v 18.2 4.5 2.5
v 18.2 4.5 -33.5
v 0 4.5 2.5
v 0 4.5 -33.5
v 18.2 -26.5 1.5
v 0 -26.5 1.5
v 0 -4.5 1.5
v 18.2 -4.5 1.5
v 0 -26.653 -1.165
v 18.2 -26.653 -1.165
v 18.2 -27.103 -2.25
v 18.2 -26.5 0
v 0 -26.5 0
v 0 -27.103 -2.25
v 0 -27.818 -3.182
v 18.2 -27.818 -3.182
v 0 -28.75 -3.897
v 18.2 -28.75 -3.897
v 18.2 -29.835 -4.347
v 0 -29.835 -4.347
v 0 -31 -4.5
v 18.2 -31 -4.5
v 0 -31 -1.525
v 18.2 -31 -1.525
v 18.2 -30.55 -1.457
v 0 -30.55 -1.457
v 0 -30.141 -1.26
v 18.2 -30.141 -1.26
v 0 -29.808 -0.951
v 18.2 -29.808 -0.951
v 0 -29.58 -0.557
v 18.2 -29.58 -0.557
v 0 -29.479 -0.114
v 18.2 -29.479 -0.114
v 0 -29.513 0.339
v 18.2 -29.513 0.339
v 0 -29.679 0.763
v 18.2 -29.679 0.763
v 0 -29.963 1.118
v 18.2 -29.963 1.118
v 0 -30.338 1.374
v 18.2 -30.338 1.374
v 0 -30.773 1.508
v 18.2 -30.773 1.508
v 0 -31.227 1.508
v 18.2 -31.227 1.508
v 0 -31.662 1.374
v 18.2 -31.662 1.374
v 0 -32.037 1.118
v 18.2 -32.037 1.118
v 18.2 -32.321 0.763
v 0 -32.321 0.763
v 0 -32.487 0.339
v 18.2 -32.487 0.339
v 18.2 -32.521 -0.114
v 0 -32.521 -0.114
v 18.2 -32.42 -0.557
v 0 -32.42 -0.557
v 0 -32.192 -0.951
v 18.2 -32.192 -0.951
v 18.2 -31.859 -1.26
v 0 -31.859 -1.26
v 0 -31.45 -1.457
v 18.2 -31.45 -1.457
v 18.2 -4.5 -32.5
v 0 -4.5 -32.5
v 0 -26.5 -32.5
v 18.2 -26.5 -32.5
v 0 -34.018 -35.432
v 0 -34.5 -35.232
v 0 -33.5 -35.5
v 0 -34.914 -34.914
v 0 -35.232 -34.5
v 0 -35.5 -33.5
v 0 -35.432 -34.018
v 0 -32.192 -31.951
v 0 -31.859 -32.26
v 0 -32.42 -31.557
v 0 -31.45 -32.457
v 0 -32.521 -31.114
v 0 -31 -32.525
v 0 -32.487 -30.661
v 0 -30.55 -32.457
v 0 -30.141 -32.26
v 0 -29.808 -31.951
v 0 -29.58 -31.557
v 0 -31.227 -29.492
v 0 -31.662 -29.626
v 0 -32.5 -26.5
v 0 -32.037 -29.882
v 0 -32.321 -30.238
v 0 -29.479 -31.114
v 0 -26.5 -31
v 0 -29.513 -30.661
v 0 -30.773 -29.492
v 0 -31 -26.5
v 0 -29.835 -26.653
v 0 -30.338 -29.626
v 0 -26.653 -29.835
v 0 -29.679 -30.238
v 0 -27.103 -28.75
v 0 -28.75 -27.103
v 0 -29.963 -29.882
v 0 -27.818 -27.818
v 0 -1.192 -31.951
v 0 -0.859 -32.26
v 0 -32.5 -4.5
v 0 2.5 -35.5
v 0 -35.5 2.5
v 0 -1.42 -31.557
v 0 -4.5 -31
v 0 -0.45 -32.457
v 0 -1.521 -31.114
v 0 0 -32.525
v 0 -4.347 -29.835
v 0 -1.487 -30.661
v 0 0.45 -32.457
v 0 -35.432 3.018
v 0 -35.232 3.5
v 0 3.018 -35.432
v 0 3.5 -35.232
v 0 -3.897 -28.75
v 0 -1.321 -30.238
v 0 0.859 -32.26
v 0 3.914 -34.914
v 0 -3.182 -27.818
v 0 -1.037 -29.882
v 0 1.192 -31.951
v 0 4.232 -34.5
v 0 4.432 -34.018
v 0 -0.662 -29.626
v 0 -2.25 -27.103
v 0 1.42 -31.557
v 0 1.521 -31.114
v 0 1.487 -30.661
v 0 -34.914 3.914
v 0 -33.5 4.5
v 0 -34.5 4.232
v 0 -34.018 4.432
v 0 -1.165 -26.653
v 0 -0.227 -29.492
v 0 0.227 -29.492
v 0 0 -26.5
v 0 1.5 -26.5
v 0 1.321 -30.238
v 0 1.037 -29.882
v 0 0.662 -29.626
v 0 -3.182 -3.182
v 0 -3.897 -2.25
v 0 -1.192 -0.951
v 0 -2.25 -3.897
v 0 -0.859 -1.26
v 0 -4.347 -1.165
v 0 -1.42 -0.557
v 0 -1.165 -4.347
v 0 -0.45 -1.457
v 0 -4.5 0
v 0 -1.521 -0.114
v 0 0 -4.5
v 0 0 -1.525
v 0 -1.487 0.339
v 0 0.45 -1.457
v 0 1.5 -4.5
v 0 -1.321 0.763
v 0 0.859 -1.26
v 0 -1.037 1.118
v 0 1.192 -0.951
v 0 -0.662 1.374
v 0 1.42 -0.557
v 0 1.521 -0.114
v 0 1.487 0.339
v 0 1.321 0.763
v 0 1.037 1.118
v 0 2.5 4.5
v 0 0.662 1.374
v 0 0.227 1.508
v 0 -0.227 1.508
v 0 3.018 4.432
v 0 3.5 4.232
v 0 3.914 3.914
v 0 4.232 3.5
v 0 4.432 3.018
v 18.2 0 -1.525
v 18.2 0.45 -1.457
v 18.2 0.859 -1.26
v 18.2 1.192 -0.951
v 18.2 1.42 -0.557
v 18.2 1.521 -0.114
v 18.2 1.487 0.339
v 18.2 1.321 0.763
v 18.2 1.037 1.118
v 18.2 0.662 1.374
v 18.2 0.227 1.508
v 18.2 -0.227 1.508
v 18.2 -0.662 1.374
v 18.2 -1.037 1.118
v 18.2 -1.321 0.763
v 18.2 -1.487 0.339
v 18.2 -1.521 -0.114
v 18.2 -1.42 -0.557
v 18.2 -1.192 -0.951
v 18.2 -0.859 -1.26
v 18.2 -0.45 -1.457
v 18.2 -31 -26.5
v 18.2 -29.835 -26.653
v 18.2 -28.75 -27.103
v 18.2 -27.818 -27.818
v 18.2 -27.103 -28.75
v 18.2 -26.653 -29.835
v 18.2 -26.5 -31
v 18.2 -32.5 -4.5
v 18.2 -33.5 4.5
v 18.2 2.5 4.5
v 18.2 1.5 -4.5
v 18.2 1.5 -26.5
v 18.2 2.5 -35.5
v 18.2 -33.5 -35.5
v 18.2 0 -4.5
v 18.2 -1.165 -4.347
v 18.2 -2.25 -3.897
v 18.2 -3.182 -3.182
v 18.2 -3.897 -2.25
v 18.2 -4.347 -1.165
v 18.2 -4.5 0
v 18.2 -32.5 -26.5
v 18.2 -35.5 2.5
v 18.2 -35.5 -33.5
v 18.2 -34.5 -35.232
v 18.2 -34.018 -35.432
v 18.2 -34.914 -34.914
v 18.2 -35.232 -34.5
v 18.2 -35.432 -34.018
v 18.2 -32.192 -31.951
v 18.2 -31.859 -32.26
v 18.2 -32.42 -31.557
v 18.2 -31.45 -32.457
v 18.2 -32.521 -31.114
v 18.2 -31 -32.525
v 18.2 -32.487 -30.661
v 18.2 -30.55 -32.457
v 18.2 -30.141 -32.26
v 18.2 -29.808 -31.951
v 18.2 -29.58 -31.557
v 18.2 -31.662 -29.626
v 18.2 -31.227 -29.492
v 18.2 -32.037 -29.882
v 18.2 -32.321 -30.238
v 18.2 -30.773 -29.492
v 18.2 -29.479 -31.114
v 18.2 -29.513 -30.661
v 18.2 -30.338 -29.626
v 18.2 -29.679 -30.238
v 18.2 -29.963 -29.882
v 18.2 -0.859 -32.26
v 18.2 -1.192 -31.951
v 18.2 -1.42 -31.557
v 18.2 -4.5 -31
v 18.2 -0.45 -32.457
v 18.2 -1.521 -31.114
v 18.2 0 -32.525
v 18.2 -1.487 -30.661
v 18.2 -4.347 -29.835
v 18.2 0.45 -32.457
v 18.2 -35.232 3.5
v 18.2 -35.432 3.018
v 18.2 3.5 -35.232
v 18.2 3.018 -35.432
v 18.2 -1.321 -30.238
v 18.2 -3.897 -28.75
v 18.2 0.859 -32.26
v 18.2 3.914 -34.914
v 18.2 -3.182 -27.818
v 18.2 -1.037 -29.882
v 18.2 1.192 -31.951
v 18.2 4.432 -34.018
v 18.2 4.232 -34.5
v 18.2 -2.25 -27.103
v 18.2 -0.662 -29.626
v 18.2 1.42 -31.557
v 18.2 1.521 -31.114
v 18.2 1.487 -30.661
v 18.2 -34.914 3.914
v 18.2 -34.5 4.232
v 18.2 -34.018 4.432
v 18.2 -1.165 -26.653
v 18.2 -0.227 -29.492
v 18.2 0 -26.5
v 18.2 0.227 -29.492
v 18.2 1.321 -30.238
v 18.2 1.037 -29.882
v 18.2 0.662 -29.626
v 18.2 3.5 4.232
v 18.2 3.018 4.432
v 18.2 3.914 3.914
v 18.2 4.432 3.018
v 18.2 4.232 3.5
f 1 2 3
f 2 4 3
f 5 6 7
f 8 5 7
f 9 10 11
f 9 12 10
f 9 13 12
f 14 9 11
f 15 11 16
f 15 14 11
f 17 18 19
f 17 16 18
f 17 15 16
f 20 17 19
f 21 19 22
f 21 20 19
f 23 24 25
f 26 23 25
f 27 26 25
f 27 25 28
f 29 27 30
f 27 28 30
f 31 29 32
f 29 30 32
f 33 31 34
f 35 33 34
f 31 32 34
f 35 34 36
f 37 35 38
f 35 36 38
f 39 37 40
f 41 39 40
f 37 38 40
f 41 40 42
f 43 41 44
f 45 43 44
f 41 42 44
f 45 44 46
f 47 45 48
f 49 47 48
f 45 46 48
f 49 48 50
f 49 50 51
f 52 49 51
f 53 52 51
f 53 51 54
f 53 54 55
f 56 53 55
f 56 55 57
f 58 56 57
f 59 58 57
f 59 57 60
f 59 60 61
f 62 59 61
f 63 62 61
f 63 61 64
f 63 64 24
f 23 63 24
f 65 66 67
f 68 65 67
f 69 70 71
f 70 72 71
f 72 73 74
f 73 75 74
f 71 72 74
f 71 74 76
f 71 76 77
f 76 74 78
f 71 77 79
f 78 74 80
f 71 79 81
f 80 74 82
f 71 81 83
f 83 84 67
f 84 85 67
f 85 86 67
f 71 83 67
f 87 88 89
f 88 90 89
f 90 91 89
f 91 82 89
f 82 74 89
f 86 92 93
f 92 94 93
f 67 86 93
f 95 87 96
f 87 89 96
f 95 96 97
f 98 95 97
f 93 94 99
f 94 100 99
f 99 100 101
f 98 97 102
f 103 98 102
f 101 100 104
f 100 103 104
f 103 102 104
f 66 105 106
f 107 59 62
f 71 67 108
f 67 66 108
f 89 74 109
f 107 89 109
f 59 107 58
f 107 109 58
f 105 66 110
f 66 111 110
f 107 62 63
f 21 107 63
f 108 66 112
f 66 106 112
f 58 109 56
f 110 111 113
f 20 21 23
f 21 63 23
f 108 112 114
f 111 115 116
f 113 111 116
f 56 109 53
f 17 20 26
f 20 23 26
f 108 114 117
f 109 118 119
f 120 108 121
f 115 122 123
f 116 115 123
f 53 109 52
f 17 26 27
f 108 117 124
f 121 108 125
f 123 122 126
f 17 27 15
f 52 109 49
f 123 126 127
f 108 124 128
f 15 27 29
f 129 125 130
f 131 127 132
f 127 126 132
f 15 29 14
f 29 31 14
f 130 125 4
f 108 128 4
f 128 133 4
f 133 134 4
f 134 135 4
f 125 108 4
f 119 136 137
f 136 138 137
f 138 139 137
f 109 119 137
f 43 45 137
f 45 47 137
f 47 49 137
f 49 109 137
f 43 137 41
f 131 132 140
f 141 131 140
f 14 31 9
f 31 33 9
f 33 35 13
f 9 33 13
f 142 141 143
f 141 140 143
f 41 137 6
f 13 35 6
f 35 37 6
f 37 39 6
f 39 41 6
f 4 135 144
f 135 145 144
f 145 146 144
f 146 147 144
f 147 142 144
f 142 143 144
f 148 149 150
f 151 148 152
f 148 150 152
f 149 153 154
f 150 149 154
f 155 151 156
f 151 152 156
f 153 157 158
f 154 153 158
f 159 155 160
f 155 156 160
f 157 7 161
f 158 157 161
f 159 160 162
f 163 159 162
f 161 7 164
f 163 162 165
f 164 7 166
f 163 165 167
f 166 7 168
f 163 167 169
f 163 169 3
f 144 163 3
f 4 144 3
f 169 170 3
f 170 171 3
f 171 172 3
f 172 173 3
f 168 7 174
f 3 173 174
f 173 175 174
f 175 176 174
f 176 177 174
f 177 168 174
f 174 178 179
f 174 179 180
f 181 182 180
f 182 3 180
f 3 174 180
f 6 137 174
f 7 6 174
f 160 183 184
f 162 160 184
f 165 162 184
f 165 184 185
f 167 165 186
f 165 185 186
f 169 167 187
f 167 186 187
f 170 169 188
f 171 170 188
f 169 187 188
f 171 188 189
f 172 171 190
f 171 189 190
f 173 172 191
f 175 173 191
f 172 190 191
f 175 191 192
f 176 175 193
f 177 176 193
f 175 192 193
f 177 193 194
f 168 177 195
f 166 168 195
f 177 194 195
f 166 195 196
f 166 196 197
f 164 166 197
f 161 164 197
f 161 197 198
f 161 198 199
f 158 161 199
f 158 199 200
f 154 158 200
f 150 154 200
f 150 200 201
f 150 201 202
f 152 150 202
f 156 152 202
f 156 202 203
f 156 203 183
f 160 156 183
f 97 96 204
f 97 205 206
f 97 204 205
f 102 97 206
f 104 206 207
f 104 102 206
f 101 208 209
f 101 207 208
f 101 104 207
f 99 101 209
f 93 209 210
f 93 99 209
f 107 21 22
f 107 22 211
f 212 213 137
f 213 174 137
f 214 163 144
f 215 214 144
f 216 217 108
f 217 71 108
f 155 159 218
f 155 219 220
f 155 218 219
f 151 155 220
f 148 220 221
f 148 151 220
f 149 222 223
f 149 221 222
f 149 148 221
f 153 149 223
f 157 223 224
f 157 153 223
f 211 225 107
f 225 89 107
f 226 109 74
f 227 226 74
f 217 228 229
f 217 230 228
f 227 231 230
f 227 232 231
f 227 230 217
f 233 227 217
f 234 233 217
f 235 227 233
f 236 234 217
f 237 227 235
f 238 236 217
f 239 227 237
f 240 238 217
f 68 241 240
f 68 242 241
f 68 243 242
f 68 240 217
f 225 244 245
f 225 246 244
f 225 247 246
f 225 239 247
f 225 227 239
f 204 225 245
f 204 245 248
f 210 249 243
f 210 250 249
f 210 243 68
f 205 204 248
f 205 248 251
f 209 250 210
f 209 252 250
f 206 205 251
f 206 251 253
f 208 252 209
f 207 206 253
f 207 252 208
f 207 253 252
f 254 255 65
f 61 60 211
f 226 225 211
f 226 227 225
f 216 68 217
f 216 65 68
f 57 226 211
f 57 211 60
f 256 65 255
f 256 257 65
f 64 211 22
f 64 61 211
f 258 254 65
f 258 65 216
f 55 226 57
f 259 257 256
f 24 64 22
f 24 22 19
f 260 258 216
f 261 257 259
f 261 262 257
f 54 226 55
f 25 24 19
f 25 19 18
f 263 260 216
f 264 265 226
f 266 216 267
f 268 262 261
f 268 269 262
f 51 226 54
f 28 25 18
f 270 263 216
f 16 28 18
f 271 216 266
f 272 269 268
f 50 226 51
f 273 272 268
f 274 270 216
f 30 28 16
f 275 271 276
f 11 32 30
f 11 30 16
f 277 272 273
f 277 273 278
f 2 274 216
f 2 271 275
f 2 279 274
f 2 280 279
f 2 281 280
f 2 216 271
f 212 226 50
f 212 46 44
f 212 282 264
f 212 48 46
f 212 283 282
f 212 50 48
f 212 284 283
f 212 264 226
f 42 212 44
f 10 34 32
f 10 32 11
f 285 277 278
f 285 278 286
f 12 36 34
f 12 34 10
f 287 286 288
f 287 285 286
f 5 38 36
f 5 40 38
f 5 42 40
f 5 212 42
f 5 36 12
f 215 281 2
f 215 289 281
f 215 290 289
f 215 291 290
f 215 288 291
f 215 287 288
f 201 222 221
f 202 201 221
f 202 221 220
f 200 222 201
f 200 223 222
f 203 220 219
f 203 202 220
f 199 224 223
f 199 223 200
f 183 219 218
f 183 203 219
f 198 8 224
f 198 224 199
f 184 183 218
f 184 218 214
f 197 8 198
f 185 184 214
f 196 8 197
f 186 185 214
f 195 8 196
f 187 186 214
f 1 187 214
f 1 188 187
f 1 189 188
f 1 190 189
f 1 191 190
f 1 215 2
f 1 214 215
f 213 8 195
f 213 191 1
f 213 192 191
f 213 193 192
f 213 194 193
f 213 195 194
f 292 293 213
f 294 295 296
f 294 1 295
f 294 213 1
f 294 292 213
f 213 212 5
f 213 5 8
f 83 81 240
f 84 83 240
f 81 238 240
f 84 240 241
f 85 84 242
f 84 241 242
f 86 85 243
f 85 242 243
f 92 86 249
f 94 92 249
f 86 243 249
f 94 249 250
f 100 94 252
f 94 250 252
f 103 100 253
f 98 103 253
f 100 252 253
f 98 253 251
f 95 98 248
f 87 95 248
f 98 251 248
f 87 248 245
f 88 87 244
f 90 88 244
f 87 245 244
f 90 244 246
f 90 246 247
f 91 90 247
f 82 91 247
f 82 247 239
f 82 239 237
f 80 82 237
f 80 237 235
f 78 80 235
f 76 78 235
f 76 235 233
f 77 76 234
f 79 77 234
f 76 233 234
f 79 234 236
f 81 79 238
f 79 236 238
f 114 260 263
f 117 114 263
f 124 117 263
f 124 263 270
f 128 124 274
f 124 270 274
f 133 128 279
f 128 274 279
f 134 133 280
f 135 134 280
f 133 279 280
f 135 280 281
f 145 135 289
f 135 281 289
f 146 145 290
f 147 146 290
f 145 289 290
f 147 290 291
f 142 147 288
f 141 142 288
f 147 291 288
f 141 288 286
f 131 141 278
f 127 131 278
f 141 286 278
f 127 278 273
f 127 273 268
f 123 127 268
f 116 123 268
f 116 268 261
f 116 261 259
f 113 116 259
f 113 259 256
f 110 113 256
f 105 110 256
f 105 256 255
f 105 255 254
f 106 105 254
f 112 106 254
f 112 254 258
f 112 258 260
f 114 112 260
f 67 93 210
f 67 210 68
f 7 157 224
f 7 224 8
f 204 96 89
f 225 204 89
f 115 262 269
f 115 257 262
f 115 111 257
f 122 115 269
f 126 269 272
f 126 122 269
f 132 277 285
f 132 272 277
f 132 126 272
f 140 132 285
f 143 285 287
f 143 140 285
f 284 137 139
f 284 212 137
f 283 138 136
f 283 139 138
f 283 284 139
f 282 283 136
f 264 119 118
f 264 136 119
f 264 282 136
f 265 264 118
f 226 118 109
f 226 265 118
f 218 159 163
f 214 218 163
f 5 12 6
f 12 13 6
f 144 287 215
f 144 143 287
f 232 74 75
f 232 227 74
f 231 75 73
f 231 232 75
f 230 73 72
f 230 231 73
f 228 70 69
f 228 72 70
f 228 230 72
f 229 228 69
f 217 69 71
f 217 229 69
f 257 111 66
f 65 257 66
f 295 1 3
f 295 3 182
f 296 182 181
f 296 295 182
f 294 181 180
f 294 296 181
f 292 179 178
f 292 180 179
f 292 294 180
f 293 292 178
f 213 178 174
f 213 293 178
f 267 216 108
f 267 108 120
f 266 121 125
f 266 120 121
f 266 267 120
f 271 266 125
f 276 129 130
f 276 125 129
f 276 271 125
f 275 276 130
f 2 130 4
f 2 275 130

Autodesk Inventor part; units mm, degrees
ref_plane "YZ Plane" through (0, 0, 0) normal (1, 0, 0) x (0, 1, 0)
ref_plane "XZ Plane" through (0, 0, 0) normal (0, 1, 0) x (-1, 0, 0)
ref_plane "XY Plane" through (0, 0, 0) normal (0, 0, 1) x (1, 0, 0)
sketch "Sketch1" plane through (0, 0, 0) normal (1, 0, 0) x (0, 1, 0)
  circle A0 centre (0, 0) radius 1.45
  circle A1 centre (0, -31) radius 1.45
  circle A2 centre (-31, -31) radius 1.45
  circle A3 centre (-31, 0) radius 1.45
  line L0 (0, 4.5) -> (-31, 4.5)
  line L1 (-31, 4.5) -> (-35.5, 4.5)
  line L2 (-35.5, 4.5) -> (-35.5, -35.5)
  line L3 (-35.5, -35.5) -> (4.5, -35.5)
  line L4 (4.5, -35.5) -> (4.5, 4.5)
  line L5 (4.5, 4.5) -> (0, 4.5)
  arc A4 (-4.5, 0) -> (0, -4.5) centre (0, 0) ccw
  arc A5 (-26.5, -31) -> (-31, -26.5) centre (-31, -31) ccw
  line L6 (-26.5, 0) -> (-26.5, 1.5)
  line L7 (-31, -4.5) -> (-32.5, -4.5)
  line L8 (-31, -26.5) -> (-32.5, -26.5)
  line L9 (-26.5, -31) -> (-26.5, -32.5)
  line L10 (-4.5, -31) -> (-4.5, -32.5)
  line L11 (0, -26.5) -> (1.5, -26.5)
  line L12 (0, -4.5) -> (1.5, -4.5)
  line L13 (-4.5, 0) -> (-4.5, 1.5)
  arc A6 (0, -26.5) -> (-4.5, -31) centre (0, -31) ccw
  arc A7 (-31, -4.5) -> (-26.5, 0) centre (-31, 0) ccw
  line L14 (-26.5, 1.5) -> (-4.5, 1.5)
  line L15 (1.5, -4.5) -> (1.5, -26.5)
  line L16 (-4.5, -32.5) -> (-26.5, -32.5)
  line L17 (-32.5, -26.5) -> (-32.5, -4.5)
extrude "Extrusion1" add sketch "Sketch1" along normal blind 18.2
fillet "Fillet1" radius 2 4 edges at (9.1, 4.5, 4.5) (9.1, 4.5, -35.5) (9.1, -35.5, 4.5) (9.1, -35.5, -35.5)
sketch "Sketch2" plane through (18.2, 0, 0) normal (1, 0, 0) x (0, 0, -1)
  circle A0 centre (0, 0) radius 1.45 projected
  circle A1 centre (0, 0) radius 1.525
  circle A2 centre (31, 0) radius 1.45 projected
  circle A3 centre (31, 0) radius 1.525
  circle A4 centre (31, -31) radius 1.45 projected
  circle A5 centre (31, -31) radius 1.525
  circle A6 centre (0, -31) radius 1.45 projected
  circle A7 centre (0, -31) radius 1.525
  dimension "d20" = 3.05
  dimension "d21" = 3.05
  dimension "d22" = 3.05
  dimension "d23" = 3.05
extrude "Extrusion2" cut sketch "Sketch2" against normal up to surface (18.2 mm away)
properties part number "encoder_cover"
